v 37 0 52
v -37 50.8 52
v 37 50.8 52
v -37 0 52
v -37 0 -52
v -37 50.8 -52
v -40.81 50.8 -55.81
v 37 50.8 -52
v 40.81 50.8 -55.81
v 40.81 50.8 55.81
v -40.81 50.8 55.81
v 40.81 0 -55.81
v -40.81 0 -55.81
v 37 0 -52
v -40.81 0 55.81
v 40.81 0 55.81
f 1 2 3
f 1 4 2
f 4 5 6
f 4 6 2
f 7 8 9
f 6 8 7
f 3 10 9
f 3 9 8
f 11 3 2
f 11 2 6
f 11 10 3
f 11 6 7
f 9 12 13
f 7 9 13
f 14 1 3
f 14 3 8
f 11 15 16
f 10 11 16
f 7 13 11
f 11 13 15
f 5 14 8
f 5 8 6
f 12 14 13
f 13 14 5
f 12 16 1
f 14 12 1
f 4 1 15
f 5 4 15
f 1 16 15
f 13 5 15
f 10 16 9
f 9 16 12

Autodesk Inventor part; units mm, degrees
ref_plane "YZ Plane" through (0, 0, 0) normal (1, 0, 0) x (0, 1, 0)
ref_plane "XZ Plane" through (0, 0, 0) normal (0, 1, 0) x (-1, 0, 0)
ref_plane "XY Plane" through (0, 0, 0) normal (0, 0, 1) x (1, 0, 0)
sketch "Sketch1" plane through (0, 0, 0) normal (0, 1, 0) x (-1, 0, 0)
  line L0 (37, 52) -> (-37, 52)
  line L1 (-37, 52) -> (-37, -52)
  line L2 (-37, -52) -> (37, -52)
  line L3 (37, -52) -> (37, 52)
  line L4 (40.81, 55.81) -> (-40.81, 55.81)
  line L5 (-40.81, 55.81) -> (-40.81, -55.81)
  line L6 (-40.81, -55.81) -> (40.81, -55.81)
  line L7 (40.81, -55.81) -> (40.81, 55.81)
  point P0 (0, 0)
  point P1 (0, -52)
  point P2 (37, 0)
  dimension "d0" = 74
  dimension "d1" = 104
  dimension "d2" = 3.81
extrude "Extrusion1" add sketch "Sketch1" along normal blind 50.8
sketch "Sketch2" plane through (-40.81, 0, 55.81) normal (0, 0, 1) x (1, 0, 0)
  line L0 (3.81, 50.8) -> (77.81, 50.8) projected
  line L1 (40.81, 41.275) -> (40.81, 22.275)
  point P0 (40.81, 0)
  dimension "d6" = 19
properties part number "Case"
